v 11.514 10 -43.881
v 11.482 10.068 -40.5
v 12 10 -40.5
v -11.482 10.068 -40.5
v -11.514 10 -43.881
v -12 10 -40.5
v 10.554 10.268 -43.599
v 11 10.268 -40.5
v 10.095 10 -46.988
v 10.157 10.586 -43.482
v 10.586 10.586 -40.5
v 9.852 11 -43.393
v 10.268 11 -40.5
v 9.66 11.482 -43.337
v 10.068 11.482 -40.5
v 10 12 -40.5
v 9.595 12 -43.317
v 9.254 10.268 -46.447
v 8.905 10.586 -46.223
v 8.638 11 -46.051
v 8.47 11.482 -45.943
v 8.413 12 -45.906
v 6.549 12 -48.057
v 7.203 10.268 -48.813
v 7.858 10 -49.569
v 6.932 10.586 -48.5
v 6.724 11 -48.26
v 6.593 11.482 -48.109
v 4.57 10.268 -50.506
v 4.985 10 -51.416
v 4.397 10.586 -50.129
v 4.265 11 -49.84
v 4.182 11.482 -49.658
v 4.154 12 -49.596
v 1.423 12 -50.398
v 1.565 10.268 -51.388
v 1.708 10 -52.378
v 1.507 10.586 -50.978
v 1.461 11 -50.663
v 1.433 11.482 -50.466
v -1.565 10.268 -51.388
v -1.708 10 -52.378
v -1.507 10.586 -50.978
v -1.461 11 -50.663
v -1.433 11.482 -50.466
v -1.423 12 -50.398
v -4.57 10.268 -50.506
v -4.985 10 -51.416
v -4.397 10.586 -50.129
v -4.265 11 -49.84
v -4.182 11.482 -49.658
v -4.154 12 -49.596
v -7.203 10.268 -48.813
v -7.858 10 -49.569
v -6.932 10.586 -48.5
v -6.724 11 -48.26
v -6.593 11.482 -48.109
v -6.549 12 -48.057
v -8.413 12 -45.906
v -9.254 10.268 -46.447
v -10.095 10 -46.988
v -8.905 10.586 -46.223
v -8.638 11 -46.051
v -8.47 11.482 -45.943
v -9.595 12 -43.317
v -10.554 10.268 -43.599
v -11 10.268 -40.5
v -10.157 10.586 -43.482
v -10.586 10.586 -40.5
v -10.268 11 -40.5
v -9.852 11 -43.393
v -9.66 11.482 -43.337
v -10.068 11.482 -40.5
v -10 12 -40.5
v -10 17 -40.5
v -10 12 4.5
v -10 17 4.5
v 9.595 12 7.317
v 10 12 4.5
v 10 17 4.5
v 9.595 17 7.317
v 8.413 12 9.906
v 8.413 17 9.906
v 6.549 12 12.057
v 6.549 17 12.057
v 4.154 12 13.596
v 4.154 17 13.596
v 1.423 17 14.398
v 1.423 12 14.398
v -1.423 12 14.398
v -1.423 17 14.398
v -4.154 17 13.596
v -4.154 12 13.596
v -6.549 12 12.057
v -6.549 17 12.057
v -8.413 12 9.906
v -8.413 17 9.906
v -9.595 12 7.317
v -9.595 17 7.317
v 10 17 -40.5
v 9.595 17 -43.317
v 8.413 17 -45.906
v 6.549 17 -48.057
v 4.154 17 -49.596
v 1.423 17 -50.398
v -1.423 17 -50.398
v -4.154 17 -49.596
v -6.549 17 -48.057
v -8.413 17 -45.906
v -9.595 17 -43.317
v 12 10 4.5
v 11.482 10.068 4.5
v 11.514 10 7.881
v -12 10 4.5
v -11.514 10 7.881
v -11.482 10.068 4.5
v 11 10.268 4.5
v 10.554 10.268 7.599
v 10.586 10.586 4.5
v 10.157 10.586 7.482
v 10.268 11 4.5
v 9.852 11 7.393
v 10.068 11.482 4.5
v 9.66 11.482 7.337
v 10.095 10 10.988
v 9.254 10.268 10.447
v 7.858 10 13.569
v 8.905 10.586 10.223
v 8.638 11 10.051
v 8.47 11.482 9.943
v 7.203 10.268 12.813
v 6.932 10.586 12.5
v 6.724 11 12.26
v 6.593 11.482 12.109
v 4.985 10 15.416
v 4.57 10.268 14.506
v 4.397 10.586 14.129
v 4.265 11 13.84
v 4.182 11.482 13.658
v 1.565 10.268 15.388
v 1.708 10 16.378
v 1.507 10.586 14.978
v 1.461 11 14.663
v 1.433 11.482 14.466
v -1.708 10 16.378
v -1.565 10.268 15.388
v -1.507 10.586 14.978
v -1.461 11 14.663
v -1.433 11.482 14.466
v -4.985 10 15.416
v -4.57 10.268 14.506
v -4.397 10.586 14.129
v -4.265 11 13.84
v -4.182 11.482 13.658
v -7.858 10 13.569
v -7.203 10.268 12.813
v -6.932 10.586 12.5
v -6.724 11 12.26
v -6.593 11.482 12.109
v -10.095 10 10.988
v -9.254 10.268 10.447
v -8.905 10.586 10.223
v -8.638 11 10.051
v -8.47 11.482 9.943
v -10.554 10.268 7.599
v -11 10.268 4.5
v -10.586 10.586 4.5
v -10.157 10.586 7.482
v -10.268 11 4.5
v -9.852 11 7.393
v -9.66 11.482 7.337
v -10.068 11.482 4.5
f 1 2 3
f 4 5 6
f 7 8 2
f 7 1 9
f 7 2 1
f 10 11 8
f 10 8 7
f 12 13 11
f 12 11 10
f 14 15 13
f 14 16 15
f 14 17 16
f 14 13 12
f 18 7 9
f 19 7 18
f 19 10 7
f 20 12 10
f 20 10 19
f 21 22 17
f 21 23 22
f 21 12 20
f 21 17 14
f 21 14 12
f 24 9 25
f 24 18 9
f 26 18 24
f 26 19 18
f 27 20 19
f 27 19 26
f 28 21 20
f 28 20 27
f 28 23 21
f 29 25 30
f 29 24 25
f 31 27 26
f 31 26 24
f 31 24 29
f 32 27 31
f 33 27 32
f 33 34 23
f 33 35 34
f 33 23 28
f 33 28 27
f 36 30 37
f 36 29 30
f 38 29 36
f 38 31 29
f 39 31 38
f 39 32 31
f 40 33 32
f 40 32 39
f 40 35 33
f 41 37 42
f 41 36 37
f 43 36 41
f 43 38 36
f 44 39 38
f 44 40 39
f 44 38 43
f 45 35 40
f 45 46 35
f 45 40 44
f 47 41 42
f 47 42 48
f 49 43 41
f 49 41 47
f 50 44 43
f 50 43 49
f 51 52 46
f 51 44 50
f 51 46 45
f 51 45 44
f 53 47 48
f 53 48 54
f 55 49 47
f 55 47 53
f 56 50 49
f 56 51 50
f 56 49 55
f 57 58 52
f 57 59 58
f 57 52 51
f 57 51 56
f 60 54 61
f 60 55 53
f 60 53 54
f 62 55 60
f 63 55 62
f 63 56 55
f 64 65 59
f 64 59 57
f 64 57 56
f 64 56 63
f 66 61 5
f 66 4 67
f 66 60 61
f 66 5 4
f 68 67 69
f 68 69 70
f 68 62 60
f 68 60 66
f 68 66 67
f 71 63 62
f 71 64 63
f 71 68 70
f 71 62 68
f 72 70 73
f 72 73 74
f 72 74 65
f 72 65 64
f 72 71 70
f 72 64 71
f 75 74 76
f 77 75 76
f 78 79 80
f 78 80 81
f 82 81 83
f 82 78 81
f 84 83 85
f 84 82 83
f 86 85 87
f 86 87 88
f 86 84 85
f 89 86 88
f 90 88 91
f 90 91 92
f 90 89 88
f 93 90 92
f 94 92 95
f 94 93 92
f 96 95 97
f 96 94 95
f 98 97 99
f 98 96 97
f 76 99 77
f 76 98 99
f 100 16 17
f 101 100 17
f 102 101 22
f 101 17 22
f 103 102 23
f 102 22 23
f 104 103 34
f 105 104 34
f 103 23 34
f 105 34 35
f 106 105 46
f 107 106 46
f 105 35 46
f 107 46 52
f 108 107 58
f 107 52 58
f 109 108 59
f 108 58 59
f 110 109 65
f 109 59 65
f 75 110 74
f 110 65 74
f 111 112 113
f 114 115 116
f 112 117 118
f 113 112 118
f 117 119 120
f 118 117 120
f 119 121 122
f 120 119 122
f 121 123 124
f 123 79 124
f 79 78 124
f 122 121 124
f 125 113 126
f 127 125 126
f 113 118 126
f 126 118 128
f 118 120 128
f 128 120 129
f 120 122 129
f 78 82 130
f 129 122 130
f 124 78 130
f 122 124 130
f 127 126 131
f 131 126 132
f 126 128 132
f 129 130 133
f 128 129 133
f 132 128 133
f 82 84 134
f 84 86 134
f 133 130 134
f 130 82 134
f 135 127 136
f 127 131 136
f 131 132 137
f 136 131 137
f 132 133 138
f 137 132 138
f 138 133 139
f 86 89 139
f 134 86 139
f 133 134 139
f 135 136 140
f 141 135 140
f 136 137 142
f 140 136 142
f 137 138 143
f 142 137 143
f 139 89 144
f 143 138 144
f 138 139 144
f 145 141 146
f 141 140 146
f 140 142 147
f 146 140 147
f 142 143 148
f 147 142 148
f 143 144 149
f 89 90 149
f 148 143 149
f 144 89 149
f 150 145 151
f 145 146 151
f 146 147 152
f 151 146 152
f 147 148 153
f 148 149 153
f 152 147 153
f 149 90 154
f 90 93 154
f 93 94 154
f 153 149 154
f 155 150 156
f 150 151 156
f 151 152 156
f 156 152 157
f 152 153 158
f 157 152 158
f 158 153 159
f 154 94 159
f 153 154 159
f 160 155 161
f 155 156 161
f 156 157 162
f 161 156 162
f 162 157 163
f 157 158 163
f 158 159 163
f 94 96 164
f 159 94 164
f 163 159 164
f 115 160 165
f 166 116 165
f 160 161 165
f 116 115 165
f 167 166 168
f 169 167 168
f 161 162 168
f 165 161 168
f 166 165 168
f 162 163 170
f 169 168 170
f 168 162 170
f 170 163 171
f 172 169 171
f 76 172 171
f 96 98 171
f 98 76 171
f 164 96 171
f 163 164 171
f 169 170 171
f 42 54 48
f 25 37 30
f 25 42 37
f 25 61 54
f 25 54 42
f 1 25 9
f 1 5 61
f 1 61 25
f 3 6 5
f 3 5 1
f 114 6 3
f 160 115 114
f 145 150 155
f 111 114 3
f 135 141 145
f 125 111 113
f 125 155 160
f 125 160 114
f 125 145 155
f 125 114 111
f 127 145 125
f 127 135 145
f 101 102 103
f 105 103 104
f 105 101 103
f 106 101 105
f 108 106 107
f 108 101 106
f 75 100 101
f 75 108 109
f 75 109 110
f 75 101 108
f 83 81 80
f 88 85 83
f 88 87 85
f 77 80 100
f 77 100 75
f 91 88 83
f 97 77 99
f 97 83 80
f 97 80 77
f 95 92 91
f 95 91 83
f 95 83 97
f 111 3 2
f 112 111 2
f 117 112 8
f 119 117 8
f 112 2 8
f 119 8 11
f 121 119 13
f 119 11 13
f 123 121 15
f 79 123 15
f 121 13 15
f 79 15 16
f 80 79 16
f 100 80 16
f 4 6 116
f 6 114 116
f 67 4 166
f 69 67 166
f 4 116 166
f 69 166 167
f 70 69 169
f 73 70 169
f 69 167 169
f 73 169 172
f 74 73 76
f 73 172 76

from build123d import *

# Parameters (mm, degrees)
SKETCH1_W              = 26
SKETCH1_H              = 36
BOSS_EXTRUDE1_DEPTH    = 10
BOSS_EXTRUDE2_DEPTH    = 7
FILLET1_R              = 2
SPLIT1_SURFACE_1_BACK  = 48.55
SPLIT1_SURFACE_1_DEPTH = 97.1


with BuildPart() as part:
    # Sketch1 → Boss-Extrude1 (new body)
    with BuildSketch(Plane(origin=(0, 0, 0), x_dir=(1, 0, 0), z_dir=(0, 1, 0))):
        Rectangle(SKETCH1_W, SKETCH1_H)
    extrude(amount=BOSS_EXTRUDE1_DEPTH)

    # Sketch2 → Boss-Extrude2 (add)
    with BuildSketch(Plane(origin=(0, 10, 0), x_dir=(1, 0, 0), z_dir=(0, 1, 0))):
        with BuildLine():
            Line((10, 18), (10, -4.5))
            ThreePointArc((10, -4.5), (0, -14.5), (-10, -4.5))
            Line((-10, -4.5), (-10, 18))
            Line((-10, 18), (10, 18))
        make_face()
    extrude(amount=BOSS_EXTRUDE2_DEPTH)

    # Fillet1
    fillet1_edges = [part.edges().sort_by_distance(p)[0] for p in [
        (-10, 10, -6.75),
        (0, 10, 14.5),
        (10, 10, -6.75),
    ]]
    fillet(fillet1_edges, radius=FILLET1_R)

    # Split1: cut with a surface, the side it looks to stays
    # Split1 surface: a surface, the sketch's curves swept straight by 97.1 mm
    with BuildLine(Plane.XY.offset(18).offset(-SPLIT1_SURFACE_1_BACK), mode=Mode.PRIVATE) as split1_surface_1_path:
        Line((-13, 10), (13, 10))
    split1_surface_1 = Shell.extrude(split1_surface_1_path.wire(), (0 * SPLIT1_SURFACE_1_DEPTH, 0 * SPLIT1_SURFACE_1_DEPTH, 1 * SPLIT1_SURFACE_1_DEPTH))
    split(bisect_by=split1_surface_1, keep=Keep.TOP)

    # Mirror1: part across plane


with BuildPart() as part_1:
    add(part.part)
    add(part.part.mirror(Plane(origin=(13, 10, -18), x_dir=(1, 0, 0), z_dir=(0, 0, 1))))


solid = part_1.part
